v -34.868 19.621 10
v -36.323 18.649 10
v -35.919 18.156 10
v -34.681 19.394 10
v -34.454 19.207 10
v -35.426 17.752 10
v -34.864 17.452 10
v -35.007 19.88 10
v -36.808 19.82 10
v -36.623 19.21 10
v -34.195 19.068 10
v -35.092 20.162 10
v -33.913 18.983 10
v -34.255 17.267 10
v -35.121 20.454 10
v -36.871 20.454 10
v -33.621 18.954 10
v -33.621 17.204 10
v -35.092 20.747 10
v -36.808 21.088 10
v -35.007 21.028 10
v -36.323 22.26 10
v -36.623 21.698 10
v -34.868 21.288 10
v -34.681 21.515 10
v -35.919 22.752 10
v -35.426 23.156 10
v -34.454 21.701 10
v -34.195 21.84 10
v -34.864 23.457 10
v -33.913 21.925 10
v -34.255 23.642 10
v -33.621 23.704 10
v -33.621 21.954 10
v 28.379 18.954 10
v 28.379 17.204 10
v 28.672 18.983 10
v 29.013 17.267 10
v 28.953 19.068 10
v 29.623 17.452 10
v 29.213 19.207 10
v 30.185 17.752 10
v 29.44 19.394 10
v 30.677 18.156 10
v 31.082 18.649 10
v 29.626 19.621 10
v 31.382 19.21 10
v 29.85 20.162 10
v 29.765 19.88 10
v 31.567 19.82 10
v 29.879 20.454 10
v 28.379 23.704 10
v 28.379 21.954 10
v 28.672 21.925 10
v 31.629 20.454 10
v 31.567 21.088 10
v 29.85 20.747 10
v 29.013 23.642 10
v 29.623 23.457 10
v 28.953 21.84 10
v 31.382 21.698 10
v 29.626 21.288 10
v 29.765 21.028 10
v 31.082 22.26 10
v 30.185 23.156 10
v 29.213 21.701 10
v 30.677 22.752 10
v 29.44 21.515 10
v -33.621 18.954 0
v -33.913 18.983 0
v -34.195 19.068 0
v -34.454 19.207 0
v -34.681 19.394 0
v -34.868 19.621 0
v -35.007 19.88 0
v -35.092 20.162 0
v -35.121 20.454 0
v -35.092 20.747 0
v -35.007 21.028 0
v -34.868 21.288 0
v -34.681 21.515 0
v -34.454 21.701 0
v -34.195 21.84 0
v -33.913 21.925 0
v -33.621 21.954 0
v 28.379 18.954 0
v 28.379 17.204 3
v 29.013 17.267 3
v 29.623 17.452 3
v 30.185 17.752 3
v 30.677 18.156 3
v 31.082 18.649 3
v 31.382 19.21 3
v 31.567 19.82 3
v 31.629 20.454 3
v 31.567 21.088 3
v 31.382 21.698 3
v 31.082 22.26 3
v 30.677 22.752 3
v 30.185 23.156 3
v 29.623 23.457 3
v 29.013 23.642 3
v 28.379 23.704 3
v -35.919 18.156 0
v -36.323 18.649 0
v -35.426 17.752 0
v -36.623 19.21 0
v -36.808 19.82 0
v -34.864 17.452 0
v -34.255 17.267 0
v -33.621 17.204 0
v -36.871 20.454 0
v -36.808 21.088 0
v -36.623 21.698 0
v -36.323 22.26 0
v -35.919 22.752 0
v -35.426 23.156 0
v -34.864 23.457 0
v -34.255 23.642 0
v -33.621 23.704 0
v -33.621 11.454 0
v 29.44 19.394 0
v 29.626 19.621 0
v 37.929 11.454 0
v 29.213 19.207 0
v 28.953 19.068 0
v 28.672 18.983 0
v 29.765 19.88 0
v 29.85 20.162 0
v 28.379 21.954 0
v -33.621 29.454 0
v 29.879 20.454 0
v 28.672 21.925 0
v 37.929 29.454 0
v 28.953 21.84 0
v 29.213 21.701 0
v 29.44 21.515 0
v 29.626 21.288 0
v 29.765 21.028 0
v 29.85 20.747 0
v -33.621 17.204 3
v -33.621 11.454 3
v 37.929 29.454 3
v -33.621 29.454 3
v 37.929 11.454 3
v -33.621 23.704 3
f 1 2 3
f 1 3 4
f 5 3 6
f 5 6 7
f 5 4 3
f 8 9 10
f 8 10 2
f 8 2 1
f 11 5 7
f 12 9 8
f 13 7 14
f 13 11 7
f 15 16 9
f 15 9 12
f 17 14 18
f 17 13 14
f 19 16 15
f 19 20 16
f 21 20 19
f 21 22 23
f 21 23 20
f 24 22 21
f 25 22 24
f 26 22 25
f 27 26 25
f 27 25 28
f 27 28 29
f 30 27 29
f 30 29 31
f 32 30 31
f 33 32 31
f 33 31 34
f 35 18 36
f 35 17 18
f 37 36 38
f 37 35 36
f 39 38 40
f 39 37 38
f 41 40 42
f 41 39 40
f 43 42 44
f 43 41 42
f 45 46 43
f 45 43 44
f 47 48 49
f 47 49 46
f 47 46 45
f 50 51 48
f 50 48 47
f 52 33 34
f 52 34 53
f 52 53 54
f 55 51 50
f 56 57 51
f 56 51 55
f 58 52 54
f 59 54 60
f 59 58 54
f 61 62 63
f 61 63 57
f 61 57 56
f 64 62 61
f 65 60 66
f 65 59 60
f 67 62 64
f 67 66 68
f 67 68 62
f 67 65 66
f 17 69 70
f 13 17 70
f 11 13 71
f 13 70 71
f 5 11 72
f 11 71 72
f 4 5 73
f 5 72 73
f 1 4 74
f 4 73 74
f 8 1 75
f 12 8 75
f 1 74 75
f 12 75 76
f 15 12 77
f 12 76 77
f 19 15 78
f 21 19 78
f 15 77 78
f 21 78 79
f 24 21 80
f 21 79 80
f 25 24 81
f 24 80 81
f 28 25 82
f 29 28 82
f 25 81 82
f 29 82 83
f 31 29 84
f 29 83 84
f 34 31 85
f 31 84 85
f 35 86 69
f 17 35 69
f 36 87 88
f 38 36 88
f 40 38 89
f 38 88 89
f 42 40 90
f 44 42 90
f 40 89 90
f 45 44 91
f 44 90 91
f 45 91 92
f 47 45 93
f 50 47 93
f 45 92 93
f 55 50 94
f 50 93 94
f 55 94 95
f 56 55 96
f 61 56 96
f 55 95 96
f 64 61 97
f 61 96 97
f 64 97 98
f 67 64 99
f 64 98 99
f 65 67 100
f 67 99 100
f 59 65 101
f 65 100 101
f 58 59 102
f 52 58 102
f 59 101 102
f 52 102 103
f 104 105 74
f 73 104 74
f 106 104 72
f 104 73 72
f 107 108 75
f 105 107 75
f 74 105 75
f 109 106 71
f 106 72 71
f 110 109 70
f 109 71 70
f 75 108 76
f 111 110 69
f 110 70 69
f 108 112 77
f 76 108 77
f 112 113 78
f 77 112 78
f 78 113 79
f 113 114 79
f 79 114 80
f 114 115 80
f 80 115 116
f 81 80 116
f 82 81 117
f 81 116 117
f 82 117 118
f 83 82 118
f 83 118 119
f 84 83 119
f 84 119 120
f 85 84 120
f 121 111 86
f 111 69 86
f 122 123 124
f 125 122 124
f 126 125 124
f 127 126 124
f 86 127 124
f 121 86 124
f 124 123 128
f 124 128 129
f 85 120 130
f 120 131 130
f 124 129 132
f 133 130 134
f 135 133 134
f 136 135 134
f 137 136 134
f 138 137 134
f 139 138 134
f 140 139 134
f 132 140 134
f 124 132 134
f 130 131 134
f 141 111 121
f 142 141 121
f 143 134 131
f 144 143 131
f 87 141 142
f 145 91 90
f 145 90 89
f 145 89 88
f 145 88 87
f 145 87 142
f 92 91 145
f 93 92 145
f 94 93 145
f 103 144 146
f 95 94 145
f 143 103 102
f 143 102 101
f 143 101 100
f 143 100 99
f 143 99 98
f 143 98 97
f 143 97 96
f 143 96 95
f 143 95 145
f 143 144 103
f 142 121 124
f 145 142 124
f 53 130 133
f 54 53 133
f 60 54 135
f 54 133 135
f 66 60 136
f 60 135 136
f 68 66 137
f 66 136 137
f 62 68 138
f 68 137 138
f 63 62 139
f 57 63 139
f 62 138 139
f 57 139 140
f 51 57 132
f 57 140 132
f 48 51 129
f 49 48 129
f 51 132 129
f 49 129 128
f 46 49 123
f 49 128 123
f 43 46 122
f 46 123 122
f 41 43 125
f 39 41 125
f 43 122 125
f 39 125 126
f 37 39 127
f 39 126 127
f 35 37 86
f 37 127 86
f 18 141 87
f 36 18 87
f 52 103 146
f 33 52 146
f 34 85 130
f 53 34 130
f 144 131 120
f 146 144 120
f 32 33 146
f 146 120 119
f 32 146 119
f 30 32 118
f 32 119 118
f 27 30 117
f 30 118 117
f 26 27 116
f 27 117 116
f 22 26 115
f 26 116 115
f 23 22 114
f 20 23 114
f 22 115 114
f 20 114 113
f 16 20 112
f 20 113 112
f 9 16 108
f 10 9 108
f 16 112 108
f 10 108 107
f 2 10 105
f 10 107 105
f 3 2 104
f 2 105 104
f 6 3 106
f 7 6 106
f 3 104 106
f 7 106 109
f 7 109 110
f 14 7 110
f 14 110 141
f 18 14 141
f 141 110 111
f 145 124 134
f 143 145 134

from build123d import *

# Parameters (mm, degrees)
F1_DEPTH = 3
F2_DEPTH = 10


with BuildPart() as f1:
    # F0 (on Top) → F1 (new body)
    with BuildSketch(Plane.XY):
        with BuildLine():
            Line((28.379236, 17.204217), (-33.620764, 17.204217))
            Line((-33.620764, 17.204217), (-33.620764, 11.454217))
            Line((-33.620764, 11.454217), (37.929236, 11.454217))
            Line((37.929236, 11.454217), (37.929236, 29.454217))
            Line((37.929236, 29.454217), (-33.620764, 29.454217))
            Line((-33.620764, 29.454217), (-33.620764, 23.704217))
            Line((-33.620764, 23.704217), (28.379236, 23.704217))
            ThreePointArc((28.379236, 23.704217), (31.629236, 20.454217), (28.379236, 17.204217))
        make_face()
    extrude(amount=F1_DEPTH)

    # F0 (on Top) → F2 (join)
    with BuildSketch(Plane.XY):
        with BuildLine():
            Line((-33.620764, 18.954217), (-33.620764, 17.204217))
            Line((-33.620764, 17.204217), (28.379236, 17.204217))
            ThreePointArc((28.379236, 17.204217), (31.629236, 20.454217), (28.379236, 23.704217))
            Line((28.379236, 23.704217), (-33.620764, 23.704217))
            Line((-33.620764, 23.704217), (-33.620764, 21.954217))
            Line((-33.620764, 21.954217), (28.379236, 21.954217))
            ThreePointArc((28.379236, 21.954217), (29.879236, 20.454217), (28.379236, 18.954217))
            Line((28.379236, 18.954217), (-33.620764, 18.954217))
        make_face()
        with BuildLine():
            ThreePointArc((-33.620764, 23.704217), (-36.870764, 20.454217), (-33.620764, 17.204217))
            Line((-33.620764, 17.204217), (-33.620764, 18.954217))
            ThreePointArc((-33.620764, 18.954217), (-35.120764, 20.454217), (-33.620764, 21.954217))
            Line((-33.620764, 21.954217), (-33.620764, 23.704217))
        make_face()
    extrude(amount=F2_DEPTH)


solid = f1.part
